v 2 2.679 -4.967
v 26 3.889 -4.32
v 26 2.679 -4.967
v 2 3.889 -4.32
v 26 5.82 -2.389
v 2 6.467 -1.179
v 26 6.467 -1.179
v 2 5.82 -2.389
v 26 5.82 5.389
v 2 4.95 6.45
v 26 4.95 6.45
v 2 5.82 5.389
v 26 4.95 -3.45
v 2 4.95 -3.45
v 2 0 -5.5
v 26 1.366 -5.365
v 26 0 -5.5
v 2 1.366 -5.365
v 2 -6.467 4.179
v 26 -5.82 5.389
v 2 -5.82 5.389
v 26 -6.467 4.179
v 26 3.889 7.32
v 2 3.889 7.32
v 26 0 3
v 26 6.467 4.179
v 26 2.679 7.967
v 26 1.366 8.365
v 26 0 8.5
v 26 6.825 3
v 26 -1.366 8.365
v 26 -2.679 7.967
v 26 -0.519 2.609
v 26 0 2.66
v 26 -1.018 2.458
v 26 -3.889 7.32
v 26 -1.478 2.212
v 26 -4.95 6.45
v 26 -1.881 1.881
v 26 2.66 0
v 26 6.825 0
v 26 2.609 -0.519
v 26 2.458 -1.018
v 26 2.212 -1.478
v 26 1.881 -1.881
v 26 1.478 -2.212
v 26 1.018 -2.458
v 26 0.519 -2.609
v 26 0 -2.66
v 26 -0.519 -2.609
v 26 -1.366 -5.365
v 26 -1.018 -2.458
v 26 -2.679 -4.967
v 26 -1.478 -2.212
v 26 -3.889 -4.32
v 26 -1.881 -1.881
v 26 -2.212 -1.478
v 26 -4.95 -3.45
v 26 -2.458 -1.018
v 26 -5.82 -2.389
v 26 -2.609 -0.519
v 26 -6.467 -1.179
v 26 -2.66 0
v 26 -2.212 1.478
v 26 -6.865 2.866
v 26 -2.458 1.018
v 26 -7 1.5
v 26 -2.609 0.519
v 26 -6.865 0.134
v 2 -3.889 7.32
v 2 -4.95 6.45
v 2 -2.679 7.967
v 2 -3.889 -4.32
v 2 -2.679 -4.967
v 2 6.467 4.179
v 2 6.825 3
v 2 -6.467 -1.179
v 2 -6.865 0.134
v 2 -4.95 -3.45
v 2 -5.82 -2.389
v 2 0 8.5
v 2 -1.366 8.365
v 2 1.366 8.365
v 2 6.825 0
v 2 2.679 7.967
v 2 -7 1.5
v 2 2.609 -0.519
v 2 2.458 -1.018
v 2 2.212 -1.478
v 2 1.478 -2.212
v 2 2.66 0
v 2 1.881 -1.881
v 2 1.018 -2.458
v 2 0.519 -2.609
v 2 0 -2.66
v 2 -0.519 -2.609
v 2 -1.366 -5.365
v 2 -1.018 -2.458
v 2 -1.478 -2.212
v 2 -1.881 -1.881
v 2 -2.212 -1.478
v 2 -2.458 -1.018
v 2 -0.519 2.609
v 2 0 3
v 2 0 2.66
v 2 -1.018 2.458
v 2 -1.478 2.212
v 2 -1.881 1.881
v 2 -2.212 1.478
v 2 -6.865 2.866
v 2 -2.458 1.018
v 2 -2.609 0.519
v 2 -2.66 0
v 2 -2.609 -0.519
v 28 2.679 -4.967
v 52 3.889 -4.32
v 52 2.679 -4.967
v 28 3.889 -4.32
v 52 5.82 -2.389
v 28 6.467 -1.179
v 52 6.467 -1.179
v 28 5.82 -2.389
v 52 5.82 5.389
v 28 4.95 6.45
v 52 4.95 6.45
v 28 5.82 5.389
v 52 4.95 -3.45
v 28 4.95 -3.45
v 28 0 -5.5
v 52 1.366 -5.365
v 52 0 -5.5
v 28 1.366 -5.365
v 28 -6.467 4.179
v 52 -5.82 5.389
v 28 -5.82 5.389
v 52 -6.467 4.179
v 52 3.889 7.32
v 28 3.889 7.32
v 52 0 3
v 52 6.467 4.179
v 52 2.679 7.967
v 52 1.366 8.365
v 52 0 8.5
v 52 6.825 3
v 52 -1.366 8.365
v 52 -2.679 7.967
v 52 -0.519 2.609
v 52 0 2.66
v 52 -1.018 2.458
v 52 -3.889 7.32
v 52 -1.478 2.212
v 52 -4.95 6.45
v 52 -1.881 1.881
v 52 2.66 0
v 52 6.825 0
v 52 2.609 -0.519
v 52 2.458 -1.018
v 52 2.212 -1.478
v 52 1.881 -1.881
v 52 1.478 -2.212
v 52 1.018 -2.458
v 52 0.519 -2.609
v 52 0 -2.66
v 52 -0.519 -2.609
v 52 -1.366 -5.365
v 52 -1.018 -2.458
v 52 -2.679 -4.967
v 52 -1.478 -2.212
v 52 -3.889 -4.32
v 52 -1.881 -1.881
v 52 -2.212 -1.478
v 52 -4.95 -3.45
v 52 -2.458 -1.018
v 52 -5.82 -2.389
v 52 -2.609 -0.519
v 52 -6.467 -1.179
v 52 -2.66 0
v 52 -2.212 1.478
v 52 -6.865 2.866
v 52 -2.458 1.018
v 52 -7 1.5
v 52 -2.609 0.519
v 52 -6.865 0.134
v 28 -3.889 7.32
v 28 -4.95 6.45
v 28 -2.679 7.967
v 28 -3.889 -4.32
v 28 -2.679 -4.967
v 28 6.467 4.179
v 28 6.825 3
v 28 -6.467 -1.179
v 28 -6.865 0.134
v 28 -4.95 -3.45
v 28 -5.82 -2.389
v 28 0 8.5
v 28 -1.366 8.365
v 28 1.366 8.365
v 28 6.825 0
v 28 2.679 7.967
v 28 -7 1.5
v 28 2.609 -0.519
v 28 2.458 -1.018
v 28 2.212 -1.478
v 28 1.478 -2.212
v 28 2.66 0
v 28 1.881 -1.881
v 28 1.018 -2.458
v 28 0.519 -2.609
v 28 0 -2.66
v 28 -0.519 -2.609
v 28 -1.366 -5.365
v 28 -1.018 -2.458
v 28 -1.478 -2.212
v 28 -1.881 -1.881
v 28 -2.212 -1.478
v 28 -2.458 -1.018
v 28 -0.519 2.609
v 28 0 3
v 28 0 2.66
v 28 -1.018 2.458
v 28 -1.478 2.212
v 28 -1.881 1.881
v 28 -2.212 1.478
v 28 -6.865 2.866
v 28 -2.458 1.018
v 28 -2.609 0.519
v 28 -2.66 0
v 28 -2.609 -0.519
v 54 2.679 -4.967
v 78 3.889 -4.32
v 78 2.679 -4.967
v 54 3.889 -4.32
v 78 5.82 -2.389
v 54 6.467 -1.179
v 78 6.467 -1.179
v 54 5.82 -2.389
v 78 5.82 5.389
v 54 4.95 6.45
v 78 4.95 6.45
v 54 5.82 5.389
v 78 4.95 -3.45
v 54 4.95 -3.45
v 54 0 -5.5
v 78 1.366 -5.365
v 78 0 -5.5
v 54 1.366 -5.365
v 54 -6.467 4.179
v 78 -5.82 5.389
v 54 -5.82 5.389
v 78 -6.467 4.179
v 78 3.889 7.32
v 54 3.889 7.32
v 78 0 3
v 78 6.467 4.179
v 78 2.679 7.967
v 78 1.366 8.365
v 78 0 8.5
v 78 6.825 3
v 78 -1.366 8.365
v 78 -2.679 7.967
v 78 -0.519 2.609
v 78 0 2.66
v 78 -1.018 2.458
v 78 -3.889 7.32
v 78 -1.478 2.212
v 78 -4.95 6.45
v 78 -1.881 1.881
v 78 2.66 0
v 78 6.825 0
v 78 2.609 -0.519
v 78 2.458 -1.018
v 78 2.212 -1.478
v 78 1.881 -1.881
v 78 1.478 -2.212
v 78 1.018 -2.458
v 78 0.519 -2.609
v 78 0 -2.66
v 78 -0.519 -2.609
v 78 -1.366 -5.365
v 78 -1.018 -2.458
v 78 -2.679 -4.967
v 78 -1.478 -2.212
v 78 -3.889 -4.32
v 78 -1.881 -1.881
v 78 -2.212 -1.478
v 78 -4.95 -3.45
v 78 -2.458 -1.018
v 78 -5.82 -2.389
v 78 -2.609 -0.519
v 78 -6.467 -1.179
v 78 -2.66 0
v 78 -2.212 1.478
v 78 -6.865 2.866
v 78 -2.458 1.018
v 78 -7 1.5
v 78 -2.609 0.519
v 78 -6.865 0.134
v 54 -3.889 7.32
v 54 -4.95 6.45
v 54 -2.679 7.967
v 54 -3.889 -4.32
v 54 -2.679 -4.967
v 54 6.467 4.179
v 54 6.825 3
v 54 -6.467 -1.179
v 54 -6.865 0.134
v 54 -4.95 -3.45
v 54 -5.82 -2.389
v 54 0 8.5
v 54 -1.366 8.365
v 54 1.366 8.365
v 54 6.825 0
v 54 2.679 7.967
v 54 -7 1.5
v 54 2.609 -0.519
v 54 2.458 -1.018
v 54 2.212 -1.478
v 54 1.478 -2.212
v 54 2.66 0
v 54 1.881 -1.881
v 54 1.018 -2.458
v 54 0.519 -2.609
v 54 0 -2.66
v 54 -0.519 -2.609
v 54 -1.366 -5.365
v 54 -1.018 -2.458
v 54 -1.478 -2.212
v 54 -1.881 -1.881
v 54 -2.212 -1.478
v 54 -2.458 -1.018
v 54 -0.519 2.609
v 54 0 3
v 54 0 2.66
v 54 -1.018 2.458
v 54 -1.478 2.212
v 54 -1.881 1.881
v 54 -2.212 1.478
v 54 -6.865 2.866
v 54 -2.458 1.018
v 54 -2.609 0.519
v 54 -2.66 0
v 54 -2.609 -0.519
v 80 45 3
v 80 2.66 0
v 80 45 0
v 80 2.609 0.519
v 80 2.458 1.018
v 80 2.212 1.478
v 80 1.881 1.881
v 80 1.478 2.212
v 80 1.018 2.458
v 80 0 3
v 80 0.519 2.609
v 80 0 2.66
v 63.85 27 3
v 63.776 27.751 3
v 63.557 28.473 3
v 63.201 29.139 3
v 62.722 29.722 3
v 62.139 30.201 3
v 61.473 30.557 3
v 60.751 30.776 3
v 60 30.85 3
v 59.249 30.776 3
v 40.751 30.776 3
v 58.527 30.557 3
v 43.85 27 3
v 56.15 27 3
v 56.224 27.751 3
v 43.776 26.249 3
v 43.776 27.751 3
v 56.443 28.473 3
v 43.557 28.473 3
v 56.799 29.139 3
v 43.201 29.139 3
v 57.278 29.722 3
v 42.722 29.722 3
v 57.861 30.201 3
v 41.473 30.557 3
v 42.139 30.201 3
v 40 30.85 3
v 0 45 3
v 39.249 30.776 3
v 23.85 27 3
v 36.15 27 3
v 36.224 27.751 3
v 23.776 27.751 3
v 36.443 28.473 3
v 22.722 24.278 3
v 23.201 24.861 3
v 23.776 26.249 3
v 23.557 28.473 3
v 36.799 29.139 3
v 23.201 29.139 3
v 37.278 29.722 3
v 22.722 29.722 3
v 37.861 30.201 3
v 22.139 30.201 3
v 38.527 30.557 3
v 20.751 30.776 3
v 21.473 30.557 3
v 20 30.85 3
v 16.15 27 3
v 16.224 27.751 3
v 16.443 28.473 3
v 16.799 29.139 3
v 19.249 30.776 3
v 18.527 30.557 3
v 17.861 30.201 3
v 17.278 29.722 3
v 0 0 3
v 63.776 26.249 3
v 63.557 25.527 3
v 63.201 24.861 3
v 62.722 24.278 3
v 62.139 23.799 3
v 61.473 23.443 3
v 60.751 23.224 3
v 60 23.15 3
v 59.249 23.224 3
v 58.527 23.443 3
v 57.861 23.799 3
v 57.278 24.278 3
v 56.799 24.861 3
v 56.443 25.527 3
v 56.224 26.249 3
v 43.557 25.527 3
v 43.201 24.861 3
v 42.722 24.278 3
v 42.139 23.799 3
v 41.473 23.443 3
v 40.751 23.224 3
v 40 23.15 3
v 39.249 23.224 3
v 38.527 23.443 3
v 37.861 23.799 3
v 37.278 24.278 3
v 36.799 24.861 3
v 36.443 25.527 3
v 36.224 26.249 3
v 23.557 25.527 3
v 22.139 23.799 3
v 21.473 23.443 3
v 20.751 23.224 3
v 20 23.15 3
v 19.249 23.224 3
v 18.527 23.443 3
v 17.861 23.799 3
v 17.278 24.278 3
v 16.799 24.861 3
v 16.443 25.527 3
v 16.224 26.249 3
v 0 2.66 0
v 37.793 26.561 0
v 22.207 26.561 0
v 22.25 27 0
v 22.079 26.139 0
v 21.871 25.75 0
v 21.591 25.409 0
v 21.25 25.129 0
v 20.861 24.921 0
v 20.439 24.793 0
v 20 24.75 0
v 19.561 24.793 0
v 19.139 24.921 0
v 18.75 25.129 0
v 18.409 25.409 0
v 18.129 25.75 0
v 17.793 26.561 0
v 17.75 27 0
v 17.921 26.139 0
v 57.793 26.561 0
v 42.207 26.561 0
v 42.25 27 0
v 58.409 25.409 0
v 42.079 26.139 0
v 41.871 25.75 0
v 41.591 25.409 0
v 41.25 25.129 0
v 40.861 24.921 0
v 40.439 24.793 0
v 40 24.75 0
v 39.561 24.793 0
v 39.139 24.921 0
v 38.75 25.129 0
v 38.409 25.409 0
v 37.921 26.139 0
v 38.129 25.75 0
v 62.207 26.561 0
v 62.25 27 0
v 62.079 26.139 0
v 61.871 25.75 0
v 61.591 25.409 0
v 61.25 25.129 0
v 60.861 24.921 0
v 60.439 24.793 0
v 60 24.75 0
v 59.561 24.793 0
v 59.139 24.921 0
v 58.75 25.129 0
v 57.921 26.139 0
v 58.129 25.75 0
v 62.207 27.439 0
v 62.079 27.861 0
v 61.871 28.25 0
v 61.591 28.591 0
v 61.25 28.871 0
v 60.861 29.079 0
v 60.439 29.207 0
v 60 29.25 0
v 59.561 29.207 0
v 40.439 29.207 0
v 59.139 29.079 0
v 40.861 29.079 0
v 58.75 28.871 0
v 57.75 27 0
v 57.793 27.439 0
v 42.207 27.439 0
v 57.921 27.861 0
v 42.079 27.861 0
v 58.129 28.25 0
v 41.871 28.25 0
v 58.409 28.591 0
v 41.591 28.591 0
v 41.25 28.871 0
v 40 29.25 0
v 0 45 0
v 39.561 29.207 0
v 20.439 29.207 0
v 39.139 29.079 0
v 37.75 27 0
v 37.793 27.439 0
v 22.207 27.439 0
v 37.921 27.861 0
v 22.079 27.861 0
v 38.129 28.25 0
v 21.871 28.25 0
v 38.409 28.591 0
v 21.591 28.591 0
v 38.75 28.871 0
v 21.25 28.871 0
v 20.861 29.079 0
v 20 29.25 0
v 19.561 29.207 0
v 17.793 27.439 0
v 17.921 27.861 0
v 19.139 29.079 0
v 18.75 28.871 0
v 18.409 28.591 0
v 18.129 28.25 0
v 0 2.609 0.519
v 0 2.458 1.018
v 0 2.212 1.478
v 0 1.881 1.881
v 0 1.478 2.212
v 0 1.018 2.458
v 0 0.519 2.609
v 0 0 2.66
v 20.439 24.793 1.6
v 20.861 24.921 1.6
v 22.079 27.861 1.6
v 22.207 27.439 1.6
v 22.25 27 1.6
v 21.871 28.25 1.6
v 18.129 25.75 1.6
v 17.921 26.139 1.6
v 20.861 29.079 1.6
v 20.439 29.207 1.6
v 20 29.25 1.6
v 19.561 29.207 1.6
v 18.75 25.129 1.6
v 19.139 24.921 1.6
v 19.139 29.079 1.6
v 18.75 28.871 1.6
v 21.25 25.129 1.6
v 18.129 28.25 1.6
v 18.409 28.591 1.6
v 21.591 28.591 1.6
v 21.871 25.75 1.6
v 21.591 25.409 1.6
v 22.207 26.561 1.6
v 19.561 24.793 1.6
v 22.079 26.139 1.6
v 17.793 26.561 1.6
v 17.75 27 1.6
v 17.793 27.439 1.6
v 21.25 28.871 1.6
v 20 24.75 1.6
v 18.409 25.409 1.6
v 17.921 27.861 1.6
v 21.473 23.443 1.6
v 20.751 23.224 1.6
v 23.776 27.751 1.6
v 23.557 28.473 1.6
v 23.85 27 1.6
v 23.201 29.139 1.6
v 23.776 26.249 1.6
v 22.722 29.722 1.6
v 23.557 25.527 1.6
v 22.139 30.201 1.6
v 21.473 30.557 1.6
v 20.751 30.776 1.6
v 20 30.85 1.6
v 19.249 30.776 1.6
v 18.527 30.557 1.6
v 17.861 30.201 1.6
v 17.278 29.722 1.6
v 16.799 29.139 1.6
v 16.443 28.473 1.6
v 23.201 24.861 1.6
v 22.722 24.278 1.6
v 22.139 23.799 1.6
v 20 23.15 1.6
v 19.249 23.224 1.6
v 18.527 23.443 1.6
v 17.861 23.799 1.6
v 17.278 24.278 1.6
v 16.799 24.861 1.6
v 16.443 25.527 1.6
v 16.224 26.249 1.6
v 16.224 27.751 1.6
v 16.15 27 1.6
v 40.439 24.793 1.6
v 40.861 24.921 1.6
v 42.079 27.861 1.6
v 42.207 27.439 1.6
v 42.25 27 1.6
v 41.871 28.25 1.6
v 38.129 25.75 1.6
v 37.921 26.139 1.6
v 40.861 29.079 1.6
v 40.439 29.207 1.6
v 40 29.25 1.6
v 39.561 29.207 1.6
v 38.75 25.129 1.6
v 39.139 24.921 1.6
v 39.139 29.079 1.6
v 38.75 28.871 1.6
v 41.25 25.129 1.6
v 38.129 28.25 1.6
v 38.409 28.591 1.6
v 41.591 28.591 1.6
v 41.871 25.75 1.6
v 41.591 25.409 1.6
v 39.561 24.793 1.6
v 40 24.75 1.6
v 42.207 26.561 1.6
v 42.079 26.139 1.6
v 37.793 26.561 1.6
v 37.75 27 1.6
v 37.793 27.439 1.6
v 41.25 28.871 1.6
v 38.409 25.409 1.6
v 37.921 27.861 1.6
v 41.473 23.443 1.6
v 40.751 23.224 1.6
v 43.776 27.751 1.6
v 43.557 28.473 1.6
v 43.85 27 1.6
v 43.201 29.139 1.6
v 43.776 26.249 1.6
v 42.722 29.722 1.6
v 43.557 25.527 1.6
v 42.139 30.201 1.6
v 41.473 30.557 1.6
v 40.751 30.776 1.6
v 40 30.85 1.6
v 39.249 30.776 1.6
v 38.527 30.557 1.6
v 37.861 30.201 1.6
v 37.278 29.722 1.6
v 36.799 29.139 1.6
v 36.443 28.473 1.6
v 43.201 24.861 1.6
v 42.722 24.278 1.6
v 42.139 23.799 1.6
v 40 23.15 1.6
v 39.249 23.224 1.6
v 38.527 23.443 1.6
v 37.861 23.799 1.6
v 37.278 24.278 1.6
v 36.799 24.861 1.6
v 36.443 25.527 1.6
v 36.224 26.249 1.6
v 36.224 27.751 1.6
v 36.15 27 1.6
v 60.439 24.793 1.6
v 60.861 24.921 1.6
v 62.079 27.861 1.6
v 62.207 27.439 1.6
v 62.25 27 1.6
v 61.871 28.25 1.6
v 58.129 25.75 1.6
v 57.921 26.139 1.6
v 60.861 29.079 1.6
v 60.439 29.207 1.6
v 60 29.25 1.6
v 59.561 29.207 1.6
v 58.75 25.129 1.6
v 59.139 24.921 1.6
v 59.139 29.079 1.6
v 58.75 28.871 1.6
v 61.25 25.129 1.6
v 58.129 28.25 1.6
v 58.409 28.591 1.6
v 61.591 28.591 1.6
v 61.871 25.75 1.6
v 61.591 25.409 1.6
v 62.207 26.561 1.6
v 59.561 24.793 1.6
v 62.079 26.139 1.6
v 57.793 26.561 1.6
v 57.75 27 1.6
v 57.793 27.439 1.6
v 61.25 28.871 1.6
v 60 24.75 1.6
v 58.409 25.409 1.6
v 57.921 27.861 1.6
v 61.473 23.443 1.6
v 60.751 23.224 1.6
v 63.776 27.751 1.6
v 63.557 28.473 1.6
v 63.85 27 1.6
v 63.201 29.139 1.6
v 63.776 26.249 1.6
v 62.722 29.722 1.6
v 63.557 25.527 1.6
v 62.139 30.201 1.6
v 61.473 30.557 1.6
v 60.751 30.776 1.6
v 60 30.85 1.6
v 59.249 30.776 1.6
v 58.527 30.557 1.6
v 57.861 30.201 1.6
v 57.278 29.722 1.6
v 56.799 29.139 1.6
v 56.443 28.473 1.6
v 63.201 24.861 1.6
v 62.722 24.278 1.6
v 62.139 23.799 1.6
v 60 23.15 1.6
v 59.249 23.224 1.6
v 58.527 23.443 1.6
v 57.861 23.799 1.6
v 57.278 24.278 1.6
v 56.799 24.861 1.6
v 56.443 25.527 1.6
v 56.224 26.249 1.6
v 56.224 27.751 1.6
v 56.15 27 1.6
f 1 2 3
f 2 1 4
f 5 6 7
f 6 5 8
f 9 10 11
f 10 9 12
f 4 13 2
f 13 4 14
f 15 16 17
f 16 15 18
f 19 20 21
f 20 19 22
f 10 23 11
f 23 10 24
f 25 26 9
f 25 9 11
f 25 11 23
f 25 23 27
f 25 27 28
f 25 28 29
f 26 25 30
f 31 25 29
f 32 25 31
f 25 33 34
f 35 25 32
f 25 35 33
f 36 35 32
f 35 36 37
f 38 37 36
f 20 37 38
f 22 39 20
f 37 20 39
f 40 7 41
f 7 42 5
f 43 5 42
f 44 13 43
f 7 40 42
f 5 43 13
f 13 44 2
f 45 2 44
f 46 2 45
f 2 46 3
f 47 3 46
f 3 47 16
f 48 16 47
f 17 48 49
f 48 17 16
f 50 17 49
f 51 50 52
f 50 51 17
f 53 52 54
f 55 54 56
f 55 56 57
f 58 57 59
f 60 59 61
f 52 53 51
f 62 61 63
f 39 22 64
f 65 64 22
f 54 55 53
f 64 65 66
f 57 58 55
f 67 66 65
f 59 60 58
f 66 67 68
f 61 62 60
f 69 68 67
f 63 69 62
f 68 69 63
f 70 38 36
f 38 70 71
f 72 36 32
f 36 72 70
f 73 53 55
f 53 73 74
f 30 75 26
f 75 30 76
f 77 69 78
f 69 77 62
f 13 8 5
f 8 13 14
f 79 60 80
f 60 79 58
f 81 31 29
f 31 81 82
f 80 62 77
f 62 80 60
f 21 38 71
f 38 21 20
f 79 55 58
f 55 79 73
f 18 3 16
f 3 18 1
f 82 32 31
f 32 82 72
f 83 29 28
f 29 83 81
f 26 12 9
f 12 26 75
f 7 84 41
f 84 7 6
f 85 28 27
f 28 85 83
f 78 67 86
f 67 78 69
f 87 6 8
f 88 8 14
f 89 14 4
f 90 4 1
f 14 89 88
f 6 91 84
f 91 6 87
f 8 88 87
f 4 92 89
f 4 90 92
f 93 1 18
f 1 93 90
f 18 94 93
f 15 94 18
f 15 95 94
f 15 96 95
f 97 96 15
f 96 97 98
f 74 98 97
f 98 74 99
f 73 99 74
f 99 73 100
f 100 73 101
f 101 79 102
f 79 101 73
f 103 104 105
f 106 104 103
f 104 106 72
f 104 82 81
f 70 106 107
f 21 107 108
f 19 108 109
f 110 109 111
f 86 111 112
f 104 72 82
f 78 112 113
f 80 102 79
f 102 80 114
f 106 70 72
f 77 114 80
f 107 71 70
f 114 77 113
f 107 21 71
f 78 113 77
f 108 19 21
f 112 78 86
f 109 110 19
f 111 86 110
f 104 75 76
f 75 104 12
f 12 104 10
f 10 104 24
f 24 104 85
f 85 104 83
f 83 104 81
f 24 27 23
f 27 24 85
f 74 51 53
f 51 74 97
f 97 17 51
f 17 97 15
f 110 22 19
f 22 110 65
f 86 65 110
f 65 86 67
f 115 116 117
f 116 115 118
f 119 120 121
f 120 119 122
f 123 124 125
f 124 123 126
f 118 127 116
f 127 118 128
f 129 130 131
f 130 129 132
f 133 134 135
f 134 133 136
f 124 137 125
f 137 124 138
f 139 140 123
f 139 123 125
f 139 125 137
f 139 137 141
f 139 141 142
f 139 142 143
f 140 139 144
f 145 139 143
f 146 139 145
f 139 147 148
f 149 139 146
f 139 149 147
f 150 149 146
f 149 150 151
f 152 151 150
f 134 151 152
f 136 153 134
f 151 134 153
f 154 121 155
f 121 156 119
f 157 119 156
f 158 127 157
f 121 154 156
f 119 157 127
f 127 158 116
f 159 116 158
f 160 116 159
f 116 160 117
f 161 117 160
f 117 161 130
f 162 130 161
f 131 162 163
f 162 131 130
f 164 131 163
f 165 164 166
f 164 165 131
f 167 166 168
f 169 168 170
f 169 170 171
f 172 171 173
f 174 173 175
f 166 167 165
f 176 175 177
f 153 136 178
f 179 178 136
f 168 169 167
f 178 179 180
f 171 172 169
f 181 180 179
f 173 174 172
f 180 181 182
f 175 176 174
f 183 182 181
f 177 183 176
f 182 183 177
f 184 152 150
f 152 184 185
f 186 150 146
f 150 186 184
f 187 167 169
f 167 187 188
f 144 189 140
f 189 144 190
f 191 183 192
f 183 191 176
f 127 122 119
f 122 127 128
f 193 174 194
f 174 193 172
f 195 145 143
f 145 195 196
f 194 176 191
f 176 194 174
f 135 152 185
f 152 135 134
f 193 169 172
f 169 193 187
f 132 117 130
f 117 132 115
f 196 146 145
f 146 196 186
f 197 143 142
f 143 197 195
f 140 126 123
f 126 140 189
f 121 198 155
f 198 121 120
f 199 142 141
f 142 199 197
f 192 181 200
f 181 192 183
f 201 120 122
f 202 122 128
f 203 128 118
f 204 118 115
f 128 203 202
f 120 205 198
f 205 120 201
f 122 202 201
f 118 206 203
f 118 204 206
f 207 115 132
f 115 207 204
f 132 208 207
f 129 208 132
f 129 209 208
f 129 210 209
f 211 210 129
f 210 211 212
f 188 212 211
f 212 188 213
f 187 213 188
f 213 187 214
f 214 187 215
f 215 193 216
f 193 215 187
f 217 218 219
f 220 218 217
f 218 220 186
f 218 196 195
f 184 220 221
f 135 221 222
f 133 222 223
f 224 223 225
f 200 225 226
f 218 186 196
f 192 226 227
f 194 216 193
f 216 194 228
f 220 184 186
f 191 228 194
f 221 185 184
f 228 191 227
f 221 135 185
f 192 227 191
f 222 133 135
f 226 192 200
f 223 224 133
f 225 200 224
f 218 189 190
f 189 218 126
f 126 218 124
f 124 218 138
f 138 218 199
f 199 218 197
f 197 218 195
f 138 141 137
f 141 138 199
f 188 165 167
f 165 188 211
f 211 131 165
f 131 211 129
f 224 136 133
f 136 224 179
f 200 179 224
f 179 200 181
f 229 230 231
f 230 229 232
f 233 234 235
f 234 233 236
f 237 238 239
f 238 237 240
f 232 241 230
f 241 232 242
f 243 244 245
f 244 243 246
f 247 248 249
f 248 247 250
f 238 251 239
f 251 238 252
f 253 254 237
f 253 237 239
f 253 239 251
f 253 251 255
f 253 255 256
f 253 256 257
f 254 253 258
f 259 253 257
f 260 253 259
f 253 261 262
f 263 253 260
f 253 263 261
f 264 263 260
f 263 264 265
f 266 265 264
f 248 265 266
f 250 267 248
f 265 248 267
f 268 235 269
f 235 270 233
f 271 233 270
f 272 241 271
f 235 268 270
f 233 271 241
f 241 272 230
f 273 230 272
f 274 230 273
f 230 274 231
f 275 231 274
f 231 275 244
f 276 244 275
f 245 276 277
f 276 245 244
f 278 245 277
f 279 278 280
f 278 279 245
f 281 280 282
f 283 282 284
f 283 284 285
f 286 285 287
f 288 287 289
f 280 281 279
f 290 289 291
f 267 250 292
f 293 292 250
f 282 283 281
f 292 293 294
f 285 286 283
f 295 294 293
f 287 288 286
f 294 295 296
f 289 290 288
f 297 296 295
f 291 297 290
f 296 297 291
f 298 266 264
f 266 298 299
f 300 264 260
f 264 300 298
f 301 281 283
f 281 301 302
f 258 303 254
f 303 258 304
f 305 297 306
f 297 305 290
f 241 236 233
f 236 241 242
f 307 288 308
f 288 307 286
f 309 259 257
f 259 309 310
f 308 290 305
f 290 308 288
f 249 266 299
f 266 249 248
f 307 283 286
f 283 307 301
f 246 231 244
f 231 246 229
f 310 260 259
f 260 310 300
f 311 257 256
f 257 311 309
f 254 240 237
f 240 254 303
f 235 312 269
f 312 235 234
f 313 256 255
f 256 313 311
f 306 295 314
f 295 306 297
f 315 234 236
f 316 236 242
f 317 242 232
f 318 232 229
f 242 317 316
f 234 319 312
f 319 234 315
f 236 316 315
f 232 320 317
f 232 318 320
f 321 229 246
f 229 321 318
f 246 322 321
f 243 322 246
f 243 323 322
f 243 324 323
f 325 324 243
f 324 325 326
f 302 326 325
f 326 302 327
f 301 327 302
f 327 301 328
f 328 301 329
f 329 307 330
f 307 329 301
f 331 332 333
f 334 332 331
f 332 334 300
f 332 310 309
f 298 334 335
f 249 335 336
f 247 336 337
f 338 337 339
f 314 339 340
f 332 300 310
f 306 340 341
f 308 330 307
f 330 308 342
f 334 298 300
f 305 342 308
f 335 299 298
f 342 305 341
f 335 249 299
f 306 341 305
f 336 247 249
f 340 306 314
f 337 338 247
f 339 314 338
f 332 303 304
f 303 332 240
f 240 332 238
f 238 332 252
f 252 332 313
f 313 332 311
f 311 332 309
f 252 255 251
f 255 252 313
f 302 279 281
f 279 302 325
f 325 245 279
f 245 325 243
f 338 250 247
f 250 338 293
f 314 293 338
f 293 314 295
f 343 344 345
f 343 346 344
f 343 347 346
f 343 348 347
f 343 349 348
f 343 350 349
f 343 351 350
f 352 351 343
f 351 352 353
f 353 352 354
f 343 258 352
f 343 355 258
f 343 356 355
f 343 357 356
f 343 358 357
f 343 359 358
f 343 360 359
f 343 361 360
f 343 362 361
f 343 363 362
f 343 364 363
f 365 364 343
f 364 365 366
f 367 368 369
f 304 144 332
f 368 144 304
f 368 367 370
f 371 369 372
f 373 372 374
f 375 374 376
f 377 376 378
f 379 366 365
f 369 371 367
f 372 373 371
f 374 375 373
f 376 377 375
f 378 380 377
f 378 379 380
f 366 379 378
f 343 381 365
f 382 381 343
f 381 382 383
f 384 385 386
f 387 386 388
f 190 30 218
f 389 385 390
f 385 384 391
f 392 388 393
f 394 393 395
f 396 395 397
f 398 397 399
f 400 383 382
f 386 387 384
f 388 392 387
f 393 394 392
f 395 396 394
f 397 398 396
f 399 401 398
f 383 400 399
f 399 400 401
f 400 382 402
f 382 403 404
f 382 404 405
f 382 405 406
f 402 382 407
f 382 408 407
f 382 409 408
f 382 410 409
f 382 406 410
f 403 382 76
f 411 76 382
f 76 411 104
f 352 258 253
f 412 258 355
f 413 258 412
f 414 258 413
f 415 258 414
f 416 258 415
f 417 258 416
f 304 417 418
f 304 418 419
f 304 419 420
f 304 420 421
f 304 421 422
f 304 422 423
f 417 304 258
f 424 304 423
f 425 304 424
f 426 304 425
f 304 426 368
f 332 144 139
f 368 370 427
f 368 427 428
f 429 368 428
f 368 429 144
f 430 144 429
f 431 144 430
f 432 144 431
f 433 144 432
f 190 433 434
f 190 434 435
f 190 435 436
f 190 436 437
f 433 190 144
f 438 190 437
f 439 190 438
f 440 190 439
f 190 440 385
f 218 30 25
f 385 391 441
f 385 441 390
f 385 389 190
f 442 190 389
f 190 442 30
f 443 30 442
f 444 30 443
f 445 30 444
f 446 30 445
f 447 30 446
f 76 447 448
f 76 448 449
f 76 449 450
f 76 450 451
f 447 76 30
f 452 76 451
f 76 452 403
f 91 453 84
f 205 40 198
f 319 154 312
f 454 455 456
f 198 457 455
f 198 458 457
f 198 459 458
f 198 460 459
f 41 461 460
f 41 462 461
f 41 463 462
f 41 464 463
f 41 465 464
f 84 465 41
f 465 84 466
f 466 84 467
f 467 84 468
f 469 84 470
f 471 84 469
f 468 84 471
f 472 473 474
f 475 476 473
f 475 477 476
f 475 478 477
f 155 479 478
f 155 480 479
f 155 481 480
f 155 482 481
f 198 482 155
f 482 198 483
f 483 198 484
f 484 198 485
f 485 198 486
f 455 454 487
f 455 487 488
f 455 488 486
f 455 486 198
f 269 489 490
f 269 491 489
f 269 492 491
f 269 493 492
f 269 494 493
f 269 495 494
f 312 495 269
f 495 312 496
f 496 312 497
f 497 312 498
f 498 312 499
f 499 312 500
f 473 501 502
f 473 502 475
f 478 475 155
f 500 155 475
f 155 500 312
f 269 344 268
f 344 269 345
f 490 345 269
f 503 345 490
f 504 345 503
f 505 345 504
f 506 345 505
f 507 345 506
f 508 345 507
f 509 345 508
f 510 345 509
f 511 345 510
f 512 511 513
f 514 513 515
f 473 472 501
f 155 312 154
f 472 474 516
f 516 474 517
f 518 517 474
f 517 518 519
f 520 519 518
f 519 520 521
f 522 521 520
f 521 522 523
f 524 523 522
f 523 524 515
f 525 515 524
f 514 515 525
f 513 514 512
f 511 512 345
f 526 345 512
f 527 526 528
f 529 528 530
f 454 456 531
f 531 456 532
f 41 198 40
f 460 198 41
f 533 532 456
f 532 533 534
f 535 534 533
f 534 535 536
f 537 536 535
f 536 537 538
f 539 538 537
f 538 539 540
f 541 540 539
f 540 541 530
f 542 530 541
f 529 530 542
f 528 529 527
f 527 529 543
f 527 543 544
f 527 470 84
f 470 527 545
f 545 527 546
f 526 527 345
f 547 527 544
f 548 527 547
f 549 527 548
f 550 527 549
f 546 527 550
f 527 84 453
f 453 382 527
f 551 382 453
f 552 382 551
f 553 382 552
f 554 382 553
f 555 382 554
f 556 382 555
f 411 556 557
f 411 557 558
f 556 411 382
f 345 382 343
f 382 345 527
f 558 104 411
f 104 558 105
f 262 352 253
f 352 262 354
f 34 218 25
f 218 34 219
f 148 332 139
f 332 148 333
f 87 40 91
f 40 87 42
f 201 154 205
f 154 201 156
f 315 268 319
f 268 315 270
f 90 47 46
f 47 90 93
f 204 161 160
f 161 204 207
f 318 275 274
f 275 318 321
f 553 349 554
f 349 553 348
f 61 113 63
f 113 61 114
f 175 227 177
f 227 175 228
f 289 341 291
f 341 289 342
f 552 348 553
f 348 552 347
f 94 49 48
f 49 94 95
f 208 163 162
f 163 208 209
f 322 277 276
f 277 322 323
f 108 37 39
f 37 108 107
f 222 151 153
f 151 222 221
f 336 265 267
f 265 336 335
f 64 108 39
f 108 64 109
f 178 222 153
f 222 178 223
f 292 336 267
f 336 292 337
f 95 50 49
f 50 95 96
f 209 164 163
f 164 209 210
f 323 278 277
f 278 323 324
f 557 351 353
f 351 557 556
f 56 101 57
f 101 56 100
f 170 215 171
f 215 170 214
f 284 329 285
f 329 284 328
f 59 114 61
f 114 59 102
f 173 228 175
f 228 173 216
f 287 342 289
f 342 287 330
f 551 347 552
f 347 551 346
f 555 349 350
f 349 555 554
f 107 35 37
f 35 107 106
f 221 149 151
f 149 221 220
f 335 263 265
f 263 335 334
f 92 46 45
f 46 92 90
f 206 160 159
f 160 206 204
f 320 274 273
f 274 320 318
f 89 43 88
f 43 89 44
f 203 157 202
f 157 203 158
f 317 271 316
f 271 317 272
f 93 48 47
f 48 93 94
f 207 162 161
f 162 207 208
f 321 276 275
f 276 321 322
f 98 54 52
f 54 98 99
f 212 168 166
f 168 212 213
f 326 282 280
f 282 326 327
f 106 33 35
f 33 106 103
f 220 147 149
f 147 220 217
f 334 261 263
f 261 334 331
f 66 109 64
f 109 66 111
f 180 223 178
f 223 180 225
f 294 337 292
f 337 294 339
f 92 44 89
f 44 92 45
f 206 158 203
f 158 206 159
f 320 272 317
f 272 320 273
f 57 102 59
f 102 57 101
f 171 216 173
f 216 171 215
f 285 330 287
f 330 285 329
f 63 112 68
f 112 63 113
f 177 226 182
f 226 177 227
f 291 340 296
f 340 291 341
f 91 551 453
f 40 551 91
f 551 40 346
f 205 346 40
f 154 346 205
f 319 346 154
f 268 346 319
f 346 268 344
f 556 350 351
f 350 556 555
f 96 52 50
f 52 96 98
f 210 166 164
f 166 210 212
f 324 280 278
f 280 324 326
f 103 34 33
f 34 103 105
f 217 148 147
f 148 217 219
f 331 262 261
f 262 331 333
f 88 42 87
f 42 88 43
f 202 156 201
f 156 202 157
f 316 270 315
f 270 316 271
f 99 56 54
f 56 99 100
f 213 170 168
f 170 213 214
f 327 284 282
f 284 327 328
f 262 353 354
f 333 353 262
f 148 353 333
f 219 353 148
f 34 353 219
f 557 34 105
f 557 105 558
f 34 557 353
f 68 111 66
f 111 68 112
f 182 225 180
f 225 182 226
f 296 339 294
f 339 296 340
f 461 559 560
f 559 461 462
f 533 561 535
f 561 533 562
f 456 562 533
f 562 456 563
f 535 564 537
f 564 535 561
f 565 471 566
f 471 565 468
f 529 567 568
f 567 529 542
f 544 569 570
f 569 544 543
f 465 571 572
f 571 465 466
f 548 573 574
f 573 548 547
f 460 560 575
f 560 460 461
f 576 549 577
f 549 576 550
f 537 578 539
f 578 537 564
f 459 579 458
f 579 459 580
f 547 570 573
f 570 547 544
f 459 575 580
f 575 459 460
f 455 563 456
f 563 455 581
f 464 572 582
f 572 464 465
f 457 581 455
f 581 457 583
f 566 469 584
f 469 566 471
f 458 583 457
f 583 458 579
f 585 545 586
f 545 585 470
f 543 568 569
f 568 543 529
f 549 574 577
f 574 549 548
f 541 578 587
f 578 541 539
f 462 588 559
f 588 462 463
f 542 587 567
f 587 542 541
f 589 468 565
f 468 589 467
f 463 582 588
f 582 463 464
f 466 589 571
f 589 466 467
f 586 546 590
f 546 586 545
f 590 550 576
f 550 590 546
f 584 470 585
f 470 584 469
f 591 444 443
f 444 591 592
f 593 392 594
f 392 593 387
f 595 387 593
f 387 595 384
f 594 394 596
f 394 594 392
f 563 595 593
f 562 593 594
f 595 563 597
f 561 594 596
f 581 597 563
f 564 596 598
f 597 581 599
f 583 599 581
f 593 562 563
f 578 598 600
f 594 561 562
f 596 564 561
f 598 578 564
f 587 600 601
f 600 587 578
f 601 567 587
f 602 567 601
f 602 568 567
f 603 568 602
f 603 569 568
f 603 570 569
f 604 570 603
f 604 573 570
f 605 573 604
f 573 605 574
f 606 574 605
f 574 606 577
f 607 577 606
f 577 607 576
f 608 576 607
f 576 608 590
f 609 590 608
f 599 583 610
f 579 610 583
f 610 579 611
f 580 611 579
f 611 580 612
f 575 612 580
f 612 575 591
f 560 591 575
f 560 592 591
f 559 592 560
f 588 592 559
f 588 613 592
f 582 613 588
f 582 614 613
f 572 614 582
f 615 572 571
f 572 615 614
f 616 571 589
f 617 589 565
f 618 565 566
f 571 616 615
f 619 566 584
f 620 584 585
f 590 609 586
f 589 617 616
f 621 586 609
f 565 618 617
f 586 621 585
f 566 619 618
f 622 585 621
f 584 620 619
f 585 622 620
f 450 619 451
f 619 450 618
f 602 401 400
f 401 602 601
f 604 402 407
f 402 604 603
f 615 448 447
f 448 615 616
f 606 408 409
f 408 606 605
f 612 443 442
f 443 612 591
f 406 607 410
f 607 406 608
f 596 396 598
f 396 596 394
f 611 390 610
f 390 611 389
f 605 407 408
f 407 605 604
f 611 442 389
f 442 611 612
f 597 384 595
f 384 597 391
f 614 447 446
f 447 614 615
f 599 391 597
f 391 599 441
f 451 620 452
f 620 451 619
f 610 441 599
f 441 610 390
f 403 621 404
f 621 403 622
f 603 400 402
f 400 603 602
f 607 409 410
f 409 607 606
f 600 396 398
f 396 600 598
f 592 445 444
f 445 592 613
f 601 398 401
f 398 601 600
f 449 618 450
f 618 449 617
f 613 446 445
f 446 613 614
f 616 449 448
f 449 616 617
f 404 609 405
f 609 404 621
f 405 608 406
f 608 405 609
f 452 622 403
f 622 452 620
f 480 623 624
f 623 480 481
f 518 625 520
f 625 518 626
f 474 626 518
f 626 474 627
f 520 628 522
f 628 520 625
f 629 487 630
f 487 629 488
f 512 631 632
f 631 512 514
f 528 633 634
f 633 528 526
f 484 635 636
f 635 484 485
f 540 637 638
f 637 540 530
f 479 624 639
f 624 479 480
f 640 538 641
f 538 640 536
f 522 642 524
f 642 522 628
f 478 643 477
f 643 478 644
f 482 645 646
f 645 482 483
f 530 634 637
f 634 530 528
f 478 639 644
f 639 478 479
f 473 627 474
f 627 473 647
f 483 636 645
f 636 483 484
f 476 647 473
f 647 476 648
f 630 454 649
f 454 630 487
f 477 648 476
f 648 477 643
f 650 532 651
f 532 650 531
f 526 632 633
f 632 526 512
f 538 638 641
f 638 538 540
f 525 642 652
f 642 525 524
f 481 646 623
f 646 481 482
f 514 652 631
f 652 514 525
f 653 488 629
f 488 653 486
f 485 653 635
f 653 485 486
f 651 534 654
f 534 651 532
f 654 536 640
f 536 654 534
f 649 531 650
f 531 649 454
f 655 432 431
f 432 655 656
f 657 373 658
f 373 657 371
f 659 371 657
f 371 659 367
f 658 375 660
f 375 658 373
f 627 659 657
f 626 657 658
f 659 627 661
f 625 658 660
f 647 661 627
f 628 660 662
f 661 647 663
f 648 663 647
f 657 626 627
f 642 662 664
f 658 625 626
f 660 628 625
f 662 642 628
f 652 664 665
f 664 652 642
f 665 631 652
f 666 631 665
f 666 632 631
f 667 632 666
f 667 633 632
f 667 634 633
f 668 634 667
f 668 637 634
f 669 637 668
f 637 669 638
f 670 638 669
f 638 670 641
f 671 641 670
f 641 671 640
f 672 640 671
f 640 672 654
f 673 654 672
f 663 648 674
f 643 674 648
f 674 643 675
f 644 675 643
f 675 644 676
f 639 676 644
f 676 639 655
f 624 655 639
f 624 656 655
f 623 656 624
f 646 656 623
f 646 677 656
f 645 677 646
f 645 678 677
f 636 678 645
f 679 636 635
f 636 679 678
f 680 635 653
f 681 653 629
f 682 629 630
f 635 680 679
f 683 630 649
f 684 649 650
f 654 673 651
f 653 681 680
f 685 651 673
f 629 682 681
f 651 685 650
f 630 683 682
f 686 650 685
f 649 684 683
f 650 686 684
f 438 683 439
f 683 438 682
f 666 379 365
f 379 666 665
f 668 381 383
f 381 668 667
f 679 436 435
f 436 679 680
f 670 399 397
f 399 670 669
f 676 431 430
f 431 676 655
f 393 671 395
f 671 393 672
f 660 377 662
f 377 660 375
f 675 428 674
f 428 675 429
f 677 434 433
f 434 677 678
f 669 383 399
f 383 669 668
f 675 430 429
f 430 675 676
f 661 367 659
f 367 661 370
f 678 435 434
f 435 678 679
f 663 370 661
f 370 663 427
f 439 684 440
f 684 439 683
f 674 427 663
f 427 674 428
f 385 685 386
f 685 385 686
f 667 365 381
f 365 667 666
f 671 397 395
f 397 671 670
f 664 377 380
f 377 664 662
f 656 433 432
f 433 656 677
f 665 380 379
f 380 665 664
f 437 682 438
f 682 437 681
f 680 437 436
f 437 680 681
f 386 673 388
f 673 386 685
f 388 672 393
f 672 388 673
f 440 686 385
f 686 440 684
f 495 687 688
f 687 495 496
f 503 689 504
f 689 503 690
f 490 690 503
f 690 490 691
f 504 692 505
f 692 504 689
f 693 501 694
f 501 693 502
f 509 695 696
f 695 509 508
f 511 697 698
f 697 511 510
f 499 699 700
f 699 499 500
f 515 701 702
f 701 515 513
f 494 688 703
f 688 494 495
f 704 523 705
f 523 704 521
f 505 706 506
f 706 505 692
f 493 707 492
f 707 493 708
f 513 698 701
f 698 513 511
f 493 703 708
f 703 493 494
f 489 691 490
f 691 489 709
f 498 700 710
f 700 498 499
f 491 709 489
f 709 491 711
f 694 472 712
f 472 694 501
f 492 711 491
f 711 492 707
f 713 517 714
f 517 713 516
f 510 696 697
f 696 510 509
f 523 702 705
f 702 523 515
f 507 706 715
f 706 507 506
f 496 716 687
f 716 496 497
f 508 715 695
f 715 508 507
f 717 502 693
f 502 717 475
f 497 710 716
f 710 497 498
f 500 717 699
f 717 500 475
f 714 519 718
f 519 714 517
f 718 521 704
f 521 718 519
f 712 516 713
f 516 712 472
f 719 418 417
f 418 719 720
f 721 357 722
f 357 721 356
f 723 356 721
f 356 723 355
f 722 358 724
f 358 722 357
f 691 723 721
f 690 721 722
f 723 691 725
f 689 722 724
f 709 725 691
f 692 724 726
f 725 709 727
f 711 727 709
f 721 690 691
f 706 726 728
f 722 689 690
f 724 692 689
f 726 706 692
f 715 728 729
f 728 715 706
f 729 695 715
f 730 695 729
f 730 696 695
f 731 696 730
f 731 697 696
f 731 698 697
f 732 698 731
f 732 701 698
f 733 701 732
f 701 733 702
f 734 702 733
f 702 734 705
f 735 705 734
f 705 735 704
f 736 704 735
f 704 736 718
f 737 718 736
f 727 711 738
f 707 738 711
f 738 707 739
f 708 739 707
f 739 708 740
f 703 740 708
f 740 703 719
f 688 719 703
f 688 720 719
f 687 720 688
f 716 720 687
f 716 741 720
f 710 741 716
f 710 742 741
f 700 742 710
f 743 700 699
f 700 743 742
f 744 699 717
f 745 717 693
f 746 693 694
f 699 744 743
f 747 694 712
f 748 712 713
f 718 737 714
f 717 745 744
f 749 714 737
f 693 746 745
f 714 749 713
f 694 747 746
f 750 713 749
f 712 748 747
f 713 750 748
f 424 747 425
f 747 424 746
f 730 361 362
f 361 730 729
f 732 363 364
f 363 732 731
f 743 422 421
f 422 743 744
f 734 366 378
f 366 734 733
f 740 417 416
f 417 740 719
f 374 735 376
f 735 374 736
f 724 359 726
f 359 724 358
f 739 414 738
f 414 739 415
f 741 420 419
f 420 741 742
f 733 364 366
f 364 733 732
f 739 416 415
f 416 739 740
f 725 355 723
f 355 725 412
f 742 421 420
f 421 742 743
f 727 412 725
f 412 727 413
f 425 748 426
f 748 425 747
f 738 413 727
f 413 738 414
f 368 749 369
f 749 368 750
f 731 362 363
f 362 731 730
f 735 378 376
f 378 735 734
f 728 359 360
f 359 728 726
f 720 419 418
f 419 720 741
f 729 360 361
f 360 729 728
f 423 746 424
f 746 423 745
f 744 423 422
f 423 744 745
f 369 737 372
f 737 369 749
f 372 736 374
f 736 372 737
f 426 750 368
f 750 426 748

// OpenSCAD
$fn = 32;

// ----------------------------------------------------------------------
// Hinge leaf: 80 x 52 x 14 mm
// ----------------------------------------------------------------------

// --- parameters (mm) ---
tab_len = 80;             // leaf length, X
tab_w = 45;               // leaf width, Y
tab_t = 3;                // leaf thickness
ring_d = 14;              // knuckle diameter
ring_w = 24;              // knuckle width
knuckle_n = 3;            // number of knuckles
pin_d = 5.32;             // pin bore
gap = 2;                  // gap between the knuckles
screw_d = 4.5;            // screw clearance
cs_d = 7.7;               // countersink diameter
cs_h = 1.4;               // countersink depth

module leaf() {
  cube([tab_len, tab_w, tab_t]);
}

module knuckles() {
  /* barrels sit on the leaf edge, the pin axis at half the leaf thickness */
  for (i = [0 : knuckle_n - 1])
    translate([gap + i * (ring_w + gap), 0, tab_t * 0.5])
      rotate([0, 90, 0]) cylinder(h = ring_w, d = ring_d);
}

difference() {
  union() {
    leaf();
    knuckles();
  }
  rotate([0, 90, 0]) translate([0, 0, -1])
    cylinder(h = tab_len + 2, d = pin_d);
  translate([20, tab_w * 0.6, -1]) cylinder(h = tab_t + 2, d = screw_d);
  translate([20, tab_w * 0.6, tab_t - cs_h]) cylinder(h = cs_h + 0.5, d = cs_d);
  translate([40, tab_w * 0.6, -1]) cylinder(h = tab_t + 2, d = screw_d);
  translate([40, tab_w * 0.6, tab_t - cs_h]) cylinder(h = cs_h + 0.5, d = cs_d);
  translate([60, tab_w * 0.6, -1]) cylinder(h = tab_t + 2, d = screw_d);
  translate([60, tab_w * 0.6, tab_t - cs_h]) cylinder(h = cs_h + 0.5, d = cs_d);
}
